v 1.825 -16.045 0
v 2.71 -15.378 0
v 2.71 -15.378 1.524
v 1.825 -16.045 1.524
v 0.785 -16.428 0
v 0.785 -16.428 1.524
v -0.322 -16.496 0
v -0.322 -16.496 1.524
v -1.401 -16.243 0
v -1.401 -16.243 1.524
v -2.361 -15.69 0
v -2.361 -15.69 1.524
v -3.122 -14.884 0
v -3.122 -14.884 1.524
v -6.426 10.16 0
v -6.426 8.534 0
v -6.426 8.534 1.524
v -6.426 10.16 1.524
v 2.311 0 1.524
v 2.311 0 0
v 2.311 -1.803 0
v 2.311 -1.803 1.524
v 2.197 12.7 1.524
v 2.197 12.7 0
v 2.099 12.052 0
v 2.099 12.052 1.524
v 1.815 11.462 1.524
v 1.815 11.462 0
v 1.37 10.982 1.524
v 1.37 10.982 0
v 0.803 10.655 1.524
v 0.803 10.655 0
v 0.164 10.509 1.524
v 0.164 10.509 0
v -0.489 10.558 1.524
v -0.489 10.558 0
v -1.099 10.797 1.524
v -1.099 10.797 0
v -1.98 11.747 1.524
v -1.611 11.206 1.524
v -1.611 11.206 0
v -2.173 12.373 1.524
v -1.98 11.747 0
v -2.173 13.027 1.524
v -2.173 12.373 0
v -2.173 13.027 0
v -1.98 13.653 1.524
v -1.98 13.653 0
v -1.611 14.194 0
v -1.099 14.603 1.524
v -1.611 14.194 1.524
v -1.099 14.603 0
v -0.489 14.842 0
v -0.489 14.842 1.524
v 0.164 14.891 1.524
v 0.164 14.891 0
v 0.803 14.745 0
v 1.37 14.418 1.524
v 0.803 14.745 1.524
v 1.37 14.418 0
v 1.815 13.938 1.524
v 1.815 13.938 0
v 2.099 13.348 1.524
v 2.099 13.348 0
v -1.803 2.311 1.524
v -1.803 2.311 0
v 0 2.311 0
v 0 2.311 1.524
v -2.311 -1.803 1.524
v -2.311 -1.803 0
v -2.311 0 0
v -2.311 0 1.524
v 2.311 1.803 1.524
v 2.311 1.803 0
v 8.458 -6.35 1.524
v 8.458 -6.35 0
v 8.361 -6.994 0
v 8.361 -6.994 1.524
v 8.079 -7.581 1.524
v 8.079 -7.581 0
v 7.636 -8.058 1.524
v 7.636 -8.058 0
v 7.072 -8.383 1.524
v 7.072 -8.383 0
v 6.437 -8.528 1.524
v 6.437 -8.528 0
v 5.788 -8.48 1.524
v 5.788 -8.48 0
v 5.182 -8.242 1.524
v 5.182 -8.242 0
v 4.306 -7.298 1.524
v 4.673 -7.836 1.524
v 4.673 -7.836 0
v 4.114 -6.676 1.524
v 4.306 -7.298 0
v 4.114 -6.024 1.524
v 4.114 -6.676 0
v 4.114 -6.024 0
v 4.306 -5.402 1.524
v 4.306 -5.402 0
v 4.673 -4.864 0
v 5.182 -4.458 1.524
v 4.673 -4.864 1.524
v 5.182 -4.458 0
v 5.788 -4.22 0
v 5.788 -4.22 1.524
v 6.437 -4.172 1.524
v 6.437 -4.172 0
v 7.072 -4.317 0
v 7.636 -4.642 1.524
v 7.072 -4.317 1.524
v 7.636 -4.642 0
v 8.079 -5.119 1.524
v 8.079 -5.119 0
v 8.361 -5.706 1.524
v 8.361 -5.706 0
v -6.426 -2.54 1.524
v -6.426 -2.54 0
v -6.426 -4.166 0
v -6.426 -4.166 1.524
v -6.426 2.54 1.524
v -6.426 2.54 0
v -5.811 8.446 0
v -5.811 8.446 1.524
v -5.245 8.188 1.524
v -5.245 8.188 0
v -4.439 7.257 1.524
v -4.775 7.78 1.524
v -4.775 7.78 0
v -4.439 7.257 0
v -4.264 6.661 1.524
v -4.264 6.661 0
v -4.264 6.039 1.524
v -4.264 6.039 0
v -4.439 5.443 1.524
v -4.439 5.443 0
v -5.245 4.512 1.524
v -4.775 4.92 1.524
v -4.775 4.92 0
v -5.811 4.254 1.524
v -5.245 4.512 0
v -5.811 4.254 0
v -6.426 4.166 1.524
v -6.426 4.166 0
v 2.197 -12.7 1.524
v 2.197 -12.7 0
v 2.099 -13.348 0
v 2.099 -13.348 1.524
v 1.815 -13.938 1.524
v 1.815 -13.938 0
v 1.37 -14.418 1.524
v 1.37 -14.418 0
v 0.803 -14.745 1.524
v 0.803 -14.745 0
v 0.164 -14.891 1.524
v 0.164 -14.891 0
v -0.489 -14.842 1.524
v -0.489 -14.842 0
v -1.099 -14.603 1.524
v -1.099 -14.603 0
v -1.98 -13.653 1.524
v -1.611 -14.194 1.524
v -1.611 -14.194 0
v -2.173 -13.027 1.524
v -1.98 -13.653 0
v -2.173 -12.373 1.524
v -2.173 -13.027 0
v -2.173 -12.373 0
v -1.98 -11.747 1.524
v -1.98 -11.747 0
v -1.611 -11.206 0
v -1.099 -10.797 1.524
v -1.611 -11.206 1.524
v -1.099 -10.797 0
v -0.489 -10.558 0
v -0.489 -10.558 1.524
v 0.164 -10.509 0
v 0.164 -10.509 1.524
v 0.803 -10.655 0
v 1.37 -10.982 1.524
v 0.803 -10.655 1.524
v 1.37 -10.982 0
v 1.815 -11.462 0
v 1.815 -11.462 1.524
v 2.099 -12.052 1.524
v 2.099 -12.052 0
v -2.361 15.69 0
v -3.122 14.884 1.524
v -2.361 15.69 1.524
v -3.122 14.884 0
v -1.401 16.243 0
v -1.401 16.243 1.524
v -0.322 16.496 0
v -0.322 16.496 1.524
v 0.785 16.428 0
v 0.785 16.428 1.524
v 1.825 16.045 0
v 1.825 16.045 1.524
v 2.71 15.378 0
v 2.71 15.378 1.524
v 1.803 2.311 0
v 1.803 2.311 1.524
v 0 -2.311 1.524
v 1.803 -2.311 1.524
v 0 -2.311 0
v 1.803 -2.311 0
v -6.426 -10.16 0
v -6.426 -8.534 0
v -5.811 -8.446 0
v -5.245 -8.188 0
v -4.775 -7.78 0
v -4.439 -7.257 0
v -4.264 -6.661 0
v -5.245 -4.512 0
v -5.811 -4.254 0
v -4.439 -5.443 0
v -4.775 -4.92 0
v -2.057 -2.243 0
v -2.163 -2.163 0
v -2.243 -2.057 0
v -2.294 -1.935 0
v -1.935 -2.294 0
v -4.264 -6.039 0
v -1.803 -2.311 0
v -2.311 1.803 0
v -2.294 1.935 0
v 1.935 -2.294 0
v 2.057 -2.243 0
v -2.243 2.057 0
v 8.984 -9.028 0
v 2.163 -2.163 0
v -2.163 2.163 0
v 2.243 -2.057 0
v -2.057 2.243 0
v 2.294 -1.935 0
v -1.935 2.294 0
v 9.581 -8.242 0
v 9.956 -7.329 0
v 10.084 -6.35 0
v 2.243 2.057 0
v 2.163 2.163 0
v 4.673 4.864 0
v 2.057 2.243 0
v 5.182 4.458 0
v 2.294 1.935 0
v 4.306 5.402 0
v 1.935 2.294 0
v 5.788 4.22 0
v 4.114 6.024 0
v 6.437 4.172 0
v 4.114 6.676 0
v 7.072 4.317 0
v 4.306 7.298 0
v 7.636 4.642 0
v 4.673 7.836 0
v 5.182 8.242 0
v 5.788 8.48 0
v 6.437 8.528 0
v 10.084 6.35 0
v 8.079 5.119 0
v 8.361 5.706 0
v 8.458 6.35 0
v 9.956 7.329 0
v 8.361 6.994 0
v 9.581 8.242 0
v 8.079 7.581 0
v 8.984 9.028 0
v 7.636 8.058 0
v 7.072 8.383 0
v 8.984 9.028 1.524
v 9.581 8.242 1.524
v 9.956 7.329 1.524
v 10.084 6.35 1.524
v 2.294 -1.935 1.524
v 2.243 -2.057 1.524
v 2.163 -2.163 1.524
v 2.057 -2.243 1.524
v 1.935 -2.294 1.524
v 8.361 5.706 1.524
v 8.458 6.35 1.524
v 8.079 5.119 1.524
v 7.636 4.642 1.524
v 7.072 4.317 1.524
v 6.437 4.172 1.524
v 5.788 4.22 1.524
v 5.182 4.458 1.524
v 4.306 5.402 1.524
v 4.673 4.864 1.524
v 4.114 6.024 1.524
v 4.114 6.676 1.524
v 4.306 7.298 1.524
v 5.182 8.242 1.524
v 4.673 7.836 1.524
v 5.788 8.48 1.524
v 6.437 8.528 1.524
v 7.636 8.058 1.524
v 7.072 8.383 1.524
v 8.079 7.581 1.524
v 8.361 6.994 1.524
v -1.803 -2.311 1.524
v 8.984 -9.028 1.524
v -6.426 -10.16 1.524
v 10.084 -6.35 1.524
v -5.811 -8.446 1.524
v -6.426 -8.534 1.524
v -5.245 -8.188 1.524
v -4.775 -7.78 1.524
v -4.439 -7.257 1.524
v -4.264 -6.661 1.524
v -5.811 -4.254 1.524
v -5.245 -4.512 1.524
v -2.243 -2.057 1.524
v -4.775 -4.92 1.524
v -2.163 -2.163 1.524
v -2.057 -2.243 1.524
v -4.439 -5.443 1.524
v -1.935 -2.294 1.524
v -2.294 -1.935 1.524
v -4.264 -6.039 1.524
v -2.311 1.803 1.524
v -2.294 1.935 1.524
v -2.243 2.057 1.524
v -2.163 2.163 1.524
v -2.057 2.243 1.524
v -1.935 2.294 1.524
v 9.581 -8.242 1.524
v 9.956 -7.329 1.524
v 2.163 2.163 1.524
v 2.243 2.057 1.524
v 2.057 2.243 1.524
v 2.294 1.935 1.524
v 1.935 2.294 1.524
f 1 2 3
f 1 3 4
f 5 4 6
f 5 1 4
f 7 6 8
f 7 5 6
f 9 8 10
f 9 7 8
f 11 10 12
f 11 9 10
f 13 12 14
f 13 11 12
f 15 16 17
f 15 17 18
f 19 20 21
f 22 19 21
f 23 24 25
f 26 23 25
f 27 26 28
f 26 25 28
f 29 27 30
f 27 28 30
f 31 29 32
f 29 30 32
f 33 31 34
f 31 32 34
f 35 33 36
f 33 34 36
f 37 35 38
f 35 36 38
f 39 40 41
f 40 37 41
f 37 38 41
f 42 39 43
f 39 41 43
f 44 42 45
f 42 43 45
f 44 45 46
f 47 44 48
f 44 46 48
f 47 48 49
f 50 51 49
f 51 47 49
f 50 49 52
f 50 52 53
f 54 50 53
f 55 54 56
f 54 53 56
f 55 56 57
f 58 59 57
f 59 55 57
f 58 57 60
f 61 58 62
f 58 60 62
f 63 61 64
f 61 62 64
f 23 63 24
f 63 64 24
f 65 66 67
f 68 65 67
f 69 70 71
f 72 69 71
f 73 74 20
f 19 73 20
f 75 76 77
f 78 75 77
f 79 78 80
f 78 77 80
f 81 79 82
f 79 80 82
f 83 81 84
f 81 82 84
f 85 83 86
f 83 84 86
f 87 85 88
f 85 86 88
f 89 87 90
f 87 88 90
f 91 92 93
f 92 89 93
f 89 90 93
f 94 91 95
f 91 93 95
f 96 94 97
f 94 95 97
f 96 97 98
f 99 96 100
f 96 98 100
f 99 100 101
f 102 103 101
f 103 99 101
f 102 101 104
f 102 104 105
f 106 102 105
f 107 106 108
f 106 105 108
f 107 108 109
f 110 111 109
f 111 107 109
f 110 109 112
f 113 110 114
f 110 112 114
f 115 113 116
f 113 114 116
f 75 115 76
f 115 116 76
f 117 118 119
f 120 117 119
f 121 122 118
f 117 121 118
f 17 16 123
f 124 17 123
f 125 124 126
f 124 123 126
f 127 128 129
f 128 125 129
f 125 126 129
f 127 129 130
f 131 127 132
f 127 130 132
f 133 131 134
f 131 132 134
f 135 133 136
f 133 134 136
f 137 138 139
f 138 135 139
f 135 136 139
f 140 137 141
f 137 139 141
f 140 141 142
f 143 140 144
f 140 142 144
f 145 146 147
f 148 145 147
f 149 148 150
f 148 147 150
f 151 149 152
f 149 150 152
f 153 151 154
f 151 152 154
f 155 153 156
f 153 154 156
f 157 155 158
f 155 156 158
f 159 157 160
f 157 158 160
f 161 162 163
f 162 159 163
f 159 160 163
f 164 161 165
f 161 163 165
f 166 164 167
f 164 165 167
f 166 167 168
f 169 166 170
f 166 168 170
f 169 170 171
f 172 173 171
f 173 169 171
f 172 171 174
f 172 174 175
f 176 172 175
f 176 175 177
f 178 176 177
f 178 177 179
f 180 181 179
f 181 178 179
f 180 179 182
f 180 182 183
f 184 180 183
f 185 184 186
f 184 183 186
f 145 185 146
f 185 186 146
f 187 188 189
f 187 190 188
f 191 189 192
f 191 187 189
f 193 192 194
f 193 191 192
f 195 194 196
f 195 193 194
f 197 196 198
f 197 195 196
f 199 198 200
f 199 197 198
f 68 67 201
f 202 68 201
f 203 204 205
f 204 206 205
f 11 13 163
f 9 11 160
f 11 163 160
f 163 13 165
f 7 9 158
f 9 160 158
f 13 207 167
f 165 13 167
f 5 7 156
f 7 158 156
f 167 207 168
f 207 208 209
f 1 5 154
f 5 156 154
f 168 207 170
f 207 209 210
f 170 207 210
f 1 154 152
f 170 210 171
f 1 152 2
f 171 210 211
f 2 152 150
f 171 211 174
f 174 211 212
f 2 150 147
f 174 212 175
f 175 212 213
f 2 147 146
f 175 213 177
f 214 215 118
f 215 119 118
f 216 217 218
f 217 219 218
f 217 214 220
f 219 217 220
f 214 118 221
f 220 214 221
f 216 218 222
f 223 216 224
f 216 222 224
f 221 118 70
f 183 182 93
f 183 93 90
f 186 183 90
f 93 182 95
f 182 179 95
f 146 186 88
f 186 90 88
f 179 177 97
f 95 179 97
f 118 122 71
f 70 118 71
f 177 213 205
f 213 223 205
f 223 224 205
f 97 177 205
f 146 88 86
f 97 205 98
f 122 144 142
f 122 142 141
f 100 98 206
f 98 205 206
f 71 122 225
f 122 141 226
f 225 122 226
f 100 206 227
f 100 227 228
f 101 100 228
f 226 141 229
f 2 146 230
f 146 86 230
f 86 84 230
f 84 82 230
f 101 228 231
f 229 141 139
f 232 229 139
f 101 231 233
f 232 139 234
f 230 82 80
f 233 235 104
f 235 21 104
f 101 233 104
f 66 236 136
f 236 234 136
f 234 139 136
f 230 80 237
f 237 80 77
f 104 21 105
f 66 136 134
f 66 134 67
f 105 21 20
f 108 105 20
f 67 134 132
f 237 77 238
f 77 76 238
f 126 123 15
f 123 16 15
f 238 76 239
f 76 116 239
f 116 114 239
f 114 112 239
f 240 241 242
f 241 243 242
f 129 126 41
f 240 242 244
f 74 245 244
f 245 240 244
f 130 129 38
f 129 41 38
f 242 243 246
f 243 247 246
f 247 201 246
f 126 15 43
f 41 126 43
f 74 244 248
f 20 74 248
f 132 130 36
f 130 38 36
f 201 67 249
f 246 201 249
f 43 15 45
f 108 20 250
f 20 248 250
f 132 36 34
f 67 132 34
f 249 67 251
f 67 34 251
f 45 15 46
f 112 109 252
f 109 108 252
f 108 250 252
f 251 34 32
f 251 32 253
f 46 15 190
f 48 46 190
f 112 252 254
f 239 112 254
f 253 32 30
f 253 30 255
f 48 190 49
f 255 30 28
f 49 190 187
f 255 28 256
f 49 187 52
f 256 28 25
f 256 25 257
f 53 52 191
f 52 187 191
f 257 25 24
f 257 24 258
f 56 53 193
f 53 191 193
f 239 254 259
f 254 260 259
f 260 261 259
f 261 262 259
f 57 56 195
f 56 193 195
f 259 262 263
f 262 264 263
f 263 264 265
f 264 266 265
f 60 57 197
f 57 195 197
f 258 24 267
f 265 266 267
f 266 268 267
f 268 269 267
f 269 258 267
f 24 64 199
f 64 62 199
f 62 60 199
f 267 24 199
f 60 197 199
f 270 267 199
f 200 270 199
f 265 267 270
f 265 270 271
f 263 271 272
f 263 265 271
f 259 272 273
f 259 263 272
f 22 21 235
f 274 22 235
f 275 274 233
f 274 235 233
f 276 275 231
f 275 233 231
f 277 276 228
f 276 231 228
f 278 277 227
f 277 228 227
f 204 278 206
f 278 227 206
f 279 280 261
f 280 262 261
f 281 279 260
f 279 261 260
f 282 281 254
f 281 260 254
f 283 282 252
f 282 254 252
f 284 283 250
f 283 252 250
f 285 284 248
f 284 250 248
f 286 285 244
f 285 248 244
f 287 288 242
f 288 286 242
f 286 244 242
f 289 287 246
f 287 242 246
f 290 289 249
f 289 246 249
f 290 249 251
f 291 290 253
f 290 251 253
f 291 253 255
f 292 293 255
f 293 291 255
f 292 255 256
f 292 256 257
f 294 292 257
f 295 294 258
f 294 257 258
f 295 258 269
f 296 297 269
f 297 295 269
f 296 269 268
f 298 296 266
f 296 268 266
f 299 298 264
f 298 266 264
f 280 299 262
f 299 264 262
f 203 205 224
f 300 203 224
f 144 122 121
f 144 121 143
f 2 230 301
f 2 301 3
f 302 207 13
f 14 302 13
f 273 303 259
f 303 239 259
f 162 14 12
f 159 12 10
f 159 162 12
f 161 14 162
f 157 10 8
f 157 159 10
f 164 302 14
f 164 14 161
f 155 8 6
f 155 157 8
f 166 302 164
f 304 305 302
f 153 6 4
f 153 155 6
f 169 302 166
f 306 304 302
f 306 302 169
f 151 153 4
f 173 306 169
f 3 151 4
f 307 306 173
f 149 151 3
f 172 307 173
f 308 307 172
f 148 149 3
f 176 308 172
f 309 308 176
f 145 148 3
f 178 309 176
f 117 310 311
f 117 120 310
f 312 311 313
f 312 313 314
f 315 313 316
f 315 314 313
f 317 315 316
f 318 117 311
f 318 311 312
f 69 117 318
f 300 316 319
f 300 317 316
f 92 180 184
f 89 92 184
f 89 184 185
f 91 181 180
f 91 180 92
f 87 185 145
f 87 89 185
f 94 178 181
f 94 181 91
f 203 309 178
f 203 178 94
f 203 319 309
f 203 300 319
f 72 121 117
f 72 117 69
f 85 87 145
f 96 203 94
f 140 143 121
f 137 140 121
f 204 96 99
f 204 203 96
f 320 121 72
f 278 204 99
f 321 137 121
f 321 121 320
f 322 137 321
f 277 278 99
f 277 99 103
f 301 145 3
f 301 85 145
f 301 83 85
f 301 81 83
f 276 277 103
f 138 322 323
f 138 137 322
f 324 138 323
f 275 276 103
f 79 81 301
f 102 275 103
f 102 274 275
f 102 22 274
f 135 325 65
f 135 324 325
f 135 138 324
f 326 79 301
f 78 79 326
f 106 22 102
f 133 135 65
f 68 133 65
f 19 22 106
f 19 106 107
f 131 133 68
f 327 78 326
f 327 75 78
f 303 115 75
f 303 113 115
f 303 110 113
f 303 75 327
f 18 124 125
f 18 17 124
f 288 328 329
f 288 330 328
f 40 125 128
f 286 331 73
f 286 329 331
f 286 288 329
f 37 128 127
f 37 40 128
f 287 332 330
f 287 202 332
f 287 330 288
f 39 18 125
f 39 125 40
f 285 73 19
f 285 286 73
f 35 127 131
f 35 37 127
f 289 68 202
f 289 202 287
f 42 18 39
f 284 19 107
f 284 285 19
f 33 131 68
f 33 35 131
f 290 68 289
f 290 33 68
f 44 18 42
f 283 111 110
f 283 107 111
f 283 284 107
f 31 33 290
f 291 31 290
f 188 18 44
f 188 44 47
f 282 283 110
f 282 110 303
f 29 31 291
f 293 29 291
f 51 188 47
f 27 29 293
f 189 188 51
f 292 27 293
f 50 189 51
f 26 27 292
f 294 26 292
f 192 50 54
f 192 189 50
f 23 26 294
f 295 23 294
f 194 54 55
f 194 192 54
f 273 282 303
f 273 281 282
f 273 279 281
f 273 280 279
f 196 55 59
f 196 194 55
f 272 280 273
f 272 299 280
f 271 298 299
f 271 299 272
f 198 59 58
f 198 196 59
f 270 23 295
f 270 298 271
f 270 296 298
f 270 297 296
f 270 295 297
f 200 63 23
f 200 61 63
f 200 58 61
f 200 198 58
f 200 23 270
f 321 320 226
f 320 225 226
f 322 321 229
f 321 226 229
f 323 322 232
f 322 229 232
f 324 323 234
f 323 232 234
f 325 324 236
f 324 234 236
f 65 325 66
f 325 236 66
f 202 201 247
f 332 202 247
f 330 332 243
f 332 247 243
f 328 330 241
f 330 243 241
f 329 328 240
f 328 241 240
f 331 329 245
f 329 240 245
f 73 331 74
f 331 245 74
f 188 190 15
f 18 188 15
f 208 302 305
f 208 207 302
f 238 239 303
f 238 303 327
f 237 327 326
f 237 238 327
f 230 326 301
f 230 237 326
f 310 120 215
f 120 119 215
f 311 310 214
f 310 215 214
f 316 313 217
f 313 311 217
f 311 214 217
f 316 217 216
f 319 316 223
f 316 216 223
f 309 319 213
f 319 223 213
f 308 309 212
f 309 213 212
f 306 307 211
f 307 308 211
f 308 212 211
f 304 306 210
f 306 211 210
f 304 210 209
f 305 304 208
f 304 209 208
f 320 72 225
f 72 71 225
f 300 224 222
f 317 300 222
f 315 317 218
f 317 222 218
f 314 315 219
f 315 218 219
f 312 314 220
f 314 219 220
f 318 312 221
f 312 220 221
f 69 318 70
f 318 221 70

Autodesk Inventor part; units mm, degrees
ref_plane "YZ Plane" through (0, 0, 0) normal (1, 0, 0) x (0, 1, 0)
ref_plane "XZ Plane" through (0, 0, 0) normal (0, 1, 0) x (-1, 0, 0)
ref_plane "XY Plane" through (0, 0, 0) normal (0, 0, 1) x (1, 0, 0)
sketch "Sketch1" plane through (0, 0, 0) normal (0, 0, 1) x (1, 0, 0)
  line L0 (0, 0) -> (0, -2.3114)
  line L1 (0, 0) -> (0, 2.3114)
  line L2 (0, 0) -> (2.3114, 0)
  line L3 (0, 0) -> (-2.3114, 0)
  line L4 (0, -2.3114) -> (-1.8034, -2.3114)
  line L5 (-2.3114, -1.8034) -> (-2.3114, 1.8034)
  line L6 (-1.8034, 2.3114) -> (1.8034, 2.3114)
  line L7 (2.3114, 1.8034) -> (2.3114, -1.8034)
  line L8 (1.8034, -2.3114) -> (0, -2.3114)
  arc A0 (1.8034, -2.3114) -> (2.3114, -1.8034) centre (1.8034, -1.8034) ccw
  arc A1 (-2.3114, -1.8034) -> (-1.8034, -2.3114) centre (-1.8034, -1.8034) ccw
  arc A2 (-1.8034, 2.3114) -> (-2.3114, 1.8034) centre (-1.8034, 1.8034) ccw
  arc A3 (2.3114, 1.8034) -> (1.8034, 2.3114) centre (1.8034, 1.8034) ccw
  circle A4 centre (6.2738, -6.35) radius 2.1844 projected
  circle A5 centre (6.2738, 6.35) radius 2.1844 projected
  line L9 (-6.4262, -10.16) -> (-6.4262, -8.5344)
  line L10 (-6.4262, -2.54) -> (-6.4262, -4.1656)
  arc A6 (-6.4262, -8.5344) -> (-6.4262, -4.1656) centre (-6.4262, -6.35) ccw
  arc A7 (-6.4262, 4.1656) -> (-6.4262, 8.5344) centre (-6.4262, 6.35) ccw
  line L11 (-6.4262, 2.54) -> (-6.4262, 4.1656)
  line L12 (-6.4262, 8.5344) -> (-6.4262, 10.16)
  circle A8 centre (0, -12.7) radius 2.1971 projected
  circle A9 centre (0, 12.7) radius 2.1971 projected
  line L13 (-3.122, 14.8838) -> (-6.4262, 10.16)
  line L14 (-6.4262, -10.16) -> (-3.122, -14.8838)
  line L15 (8.9841, -9.0278) -> (2.7103, -15.3778)
  line L16 (10.0838, -6.35) -> (10.0838, 6.35)
  line L17 (8.9841, 9.0278) -> (2.7103, 15.3778)
  arc A10 (-3.122, -14.8838) -> (2.7103, -15.3778) centre (0, -12.7) ccw
  arc A11 (8.9841, -9.0278) -> (10.0838, -6.35) centre (6.2738, -6.35) ccw
  arc A12 (10.0838, 6.35) -> (8.9841, 9.0278) centre (6.2738, 6.35) ccw
  arc A13 (2.7103, 15.3778) -> (-3.122, 14.8838) centre (0, 12.7) ccw
  line L18 (-6.4262, 2.54) -> (-6.4262, -2.54)
  point P0 (2.3114, -2.3114)
  dimension "d0" = 2.3114
  dimension "d1" = 2.3114
  dimension "d2" = 2.3114
  dimension "d3" = 2.3114
  dimension "d4" = 0.508
extrude "Extrusion1" add sketch "Sketch1" along normal blind 1.524
properties part number "pto-shaft-support"
